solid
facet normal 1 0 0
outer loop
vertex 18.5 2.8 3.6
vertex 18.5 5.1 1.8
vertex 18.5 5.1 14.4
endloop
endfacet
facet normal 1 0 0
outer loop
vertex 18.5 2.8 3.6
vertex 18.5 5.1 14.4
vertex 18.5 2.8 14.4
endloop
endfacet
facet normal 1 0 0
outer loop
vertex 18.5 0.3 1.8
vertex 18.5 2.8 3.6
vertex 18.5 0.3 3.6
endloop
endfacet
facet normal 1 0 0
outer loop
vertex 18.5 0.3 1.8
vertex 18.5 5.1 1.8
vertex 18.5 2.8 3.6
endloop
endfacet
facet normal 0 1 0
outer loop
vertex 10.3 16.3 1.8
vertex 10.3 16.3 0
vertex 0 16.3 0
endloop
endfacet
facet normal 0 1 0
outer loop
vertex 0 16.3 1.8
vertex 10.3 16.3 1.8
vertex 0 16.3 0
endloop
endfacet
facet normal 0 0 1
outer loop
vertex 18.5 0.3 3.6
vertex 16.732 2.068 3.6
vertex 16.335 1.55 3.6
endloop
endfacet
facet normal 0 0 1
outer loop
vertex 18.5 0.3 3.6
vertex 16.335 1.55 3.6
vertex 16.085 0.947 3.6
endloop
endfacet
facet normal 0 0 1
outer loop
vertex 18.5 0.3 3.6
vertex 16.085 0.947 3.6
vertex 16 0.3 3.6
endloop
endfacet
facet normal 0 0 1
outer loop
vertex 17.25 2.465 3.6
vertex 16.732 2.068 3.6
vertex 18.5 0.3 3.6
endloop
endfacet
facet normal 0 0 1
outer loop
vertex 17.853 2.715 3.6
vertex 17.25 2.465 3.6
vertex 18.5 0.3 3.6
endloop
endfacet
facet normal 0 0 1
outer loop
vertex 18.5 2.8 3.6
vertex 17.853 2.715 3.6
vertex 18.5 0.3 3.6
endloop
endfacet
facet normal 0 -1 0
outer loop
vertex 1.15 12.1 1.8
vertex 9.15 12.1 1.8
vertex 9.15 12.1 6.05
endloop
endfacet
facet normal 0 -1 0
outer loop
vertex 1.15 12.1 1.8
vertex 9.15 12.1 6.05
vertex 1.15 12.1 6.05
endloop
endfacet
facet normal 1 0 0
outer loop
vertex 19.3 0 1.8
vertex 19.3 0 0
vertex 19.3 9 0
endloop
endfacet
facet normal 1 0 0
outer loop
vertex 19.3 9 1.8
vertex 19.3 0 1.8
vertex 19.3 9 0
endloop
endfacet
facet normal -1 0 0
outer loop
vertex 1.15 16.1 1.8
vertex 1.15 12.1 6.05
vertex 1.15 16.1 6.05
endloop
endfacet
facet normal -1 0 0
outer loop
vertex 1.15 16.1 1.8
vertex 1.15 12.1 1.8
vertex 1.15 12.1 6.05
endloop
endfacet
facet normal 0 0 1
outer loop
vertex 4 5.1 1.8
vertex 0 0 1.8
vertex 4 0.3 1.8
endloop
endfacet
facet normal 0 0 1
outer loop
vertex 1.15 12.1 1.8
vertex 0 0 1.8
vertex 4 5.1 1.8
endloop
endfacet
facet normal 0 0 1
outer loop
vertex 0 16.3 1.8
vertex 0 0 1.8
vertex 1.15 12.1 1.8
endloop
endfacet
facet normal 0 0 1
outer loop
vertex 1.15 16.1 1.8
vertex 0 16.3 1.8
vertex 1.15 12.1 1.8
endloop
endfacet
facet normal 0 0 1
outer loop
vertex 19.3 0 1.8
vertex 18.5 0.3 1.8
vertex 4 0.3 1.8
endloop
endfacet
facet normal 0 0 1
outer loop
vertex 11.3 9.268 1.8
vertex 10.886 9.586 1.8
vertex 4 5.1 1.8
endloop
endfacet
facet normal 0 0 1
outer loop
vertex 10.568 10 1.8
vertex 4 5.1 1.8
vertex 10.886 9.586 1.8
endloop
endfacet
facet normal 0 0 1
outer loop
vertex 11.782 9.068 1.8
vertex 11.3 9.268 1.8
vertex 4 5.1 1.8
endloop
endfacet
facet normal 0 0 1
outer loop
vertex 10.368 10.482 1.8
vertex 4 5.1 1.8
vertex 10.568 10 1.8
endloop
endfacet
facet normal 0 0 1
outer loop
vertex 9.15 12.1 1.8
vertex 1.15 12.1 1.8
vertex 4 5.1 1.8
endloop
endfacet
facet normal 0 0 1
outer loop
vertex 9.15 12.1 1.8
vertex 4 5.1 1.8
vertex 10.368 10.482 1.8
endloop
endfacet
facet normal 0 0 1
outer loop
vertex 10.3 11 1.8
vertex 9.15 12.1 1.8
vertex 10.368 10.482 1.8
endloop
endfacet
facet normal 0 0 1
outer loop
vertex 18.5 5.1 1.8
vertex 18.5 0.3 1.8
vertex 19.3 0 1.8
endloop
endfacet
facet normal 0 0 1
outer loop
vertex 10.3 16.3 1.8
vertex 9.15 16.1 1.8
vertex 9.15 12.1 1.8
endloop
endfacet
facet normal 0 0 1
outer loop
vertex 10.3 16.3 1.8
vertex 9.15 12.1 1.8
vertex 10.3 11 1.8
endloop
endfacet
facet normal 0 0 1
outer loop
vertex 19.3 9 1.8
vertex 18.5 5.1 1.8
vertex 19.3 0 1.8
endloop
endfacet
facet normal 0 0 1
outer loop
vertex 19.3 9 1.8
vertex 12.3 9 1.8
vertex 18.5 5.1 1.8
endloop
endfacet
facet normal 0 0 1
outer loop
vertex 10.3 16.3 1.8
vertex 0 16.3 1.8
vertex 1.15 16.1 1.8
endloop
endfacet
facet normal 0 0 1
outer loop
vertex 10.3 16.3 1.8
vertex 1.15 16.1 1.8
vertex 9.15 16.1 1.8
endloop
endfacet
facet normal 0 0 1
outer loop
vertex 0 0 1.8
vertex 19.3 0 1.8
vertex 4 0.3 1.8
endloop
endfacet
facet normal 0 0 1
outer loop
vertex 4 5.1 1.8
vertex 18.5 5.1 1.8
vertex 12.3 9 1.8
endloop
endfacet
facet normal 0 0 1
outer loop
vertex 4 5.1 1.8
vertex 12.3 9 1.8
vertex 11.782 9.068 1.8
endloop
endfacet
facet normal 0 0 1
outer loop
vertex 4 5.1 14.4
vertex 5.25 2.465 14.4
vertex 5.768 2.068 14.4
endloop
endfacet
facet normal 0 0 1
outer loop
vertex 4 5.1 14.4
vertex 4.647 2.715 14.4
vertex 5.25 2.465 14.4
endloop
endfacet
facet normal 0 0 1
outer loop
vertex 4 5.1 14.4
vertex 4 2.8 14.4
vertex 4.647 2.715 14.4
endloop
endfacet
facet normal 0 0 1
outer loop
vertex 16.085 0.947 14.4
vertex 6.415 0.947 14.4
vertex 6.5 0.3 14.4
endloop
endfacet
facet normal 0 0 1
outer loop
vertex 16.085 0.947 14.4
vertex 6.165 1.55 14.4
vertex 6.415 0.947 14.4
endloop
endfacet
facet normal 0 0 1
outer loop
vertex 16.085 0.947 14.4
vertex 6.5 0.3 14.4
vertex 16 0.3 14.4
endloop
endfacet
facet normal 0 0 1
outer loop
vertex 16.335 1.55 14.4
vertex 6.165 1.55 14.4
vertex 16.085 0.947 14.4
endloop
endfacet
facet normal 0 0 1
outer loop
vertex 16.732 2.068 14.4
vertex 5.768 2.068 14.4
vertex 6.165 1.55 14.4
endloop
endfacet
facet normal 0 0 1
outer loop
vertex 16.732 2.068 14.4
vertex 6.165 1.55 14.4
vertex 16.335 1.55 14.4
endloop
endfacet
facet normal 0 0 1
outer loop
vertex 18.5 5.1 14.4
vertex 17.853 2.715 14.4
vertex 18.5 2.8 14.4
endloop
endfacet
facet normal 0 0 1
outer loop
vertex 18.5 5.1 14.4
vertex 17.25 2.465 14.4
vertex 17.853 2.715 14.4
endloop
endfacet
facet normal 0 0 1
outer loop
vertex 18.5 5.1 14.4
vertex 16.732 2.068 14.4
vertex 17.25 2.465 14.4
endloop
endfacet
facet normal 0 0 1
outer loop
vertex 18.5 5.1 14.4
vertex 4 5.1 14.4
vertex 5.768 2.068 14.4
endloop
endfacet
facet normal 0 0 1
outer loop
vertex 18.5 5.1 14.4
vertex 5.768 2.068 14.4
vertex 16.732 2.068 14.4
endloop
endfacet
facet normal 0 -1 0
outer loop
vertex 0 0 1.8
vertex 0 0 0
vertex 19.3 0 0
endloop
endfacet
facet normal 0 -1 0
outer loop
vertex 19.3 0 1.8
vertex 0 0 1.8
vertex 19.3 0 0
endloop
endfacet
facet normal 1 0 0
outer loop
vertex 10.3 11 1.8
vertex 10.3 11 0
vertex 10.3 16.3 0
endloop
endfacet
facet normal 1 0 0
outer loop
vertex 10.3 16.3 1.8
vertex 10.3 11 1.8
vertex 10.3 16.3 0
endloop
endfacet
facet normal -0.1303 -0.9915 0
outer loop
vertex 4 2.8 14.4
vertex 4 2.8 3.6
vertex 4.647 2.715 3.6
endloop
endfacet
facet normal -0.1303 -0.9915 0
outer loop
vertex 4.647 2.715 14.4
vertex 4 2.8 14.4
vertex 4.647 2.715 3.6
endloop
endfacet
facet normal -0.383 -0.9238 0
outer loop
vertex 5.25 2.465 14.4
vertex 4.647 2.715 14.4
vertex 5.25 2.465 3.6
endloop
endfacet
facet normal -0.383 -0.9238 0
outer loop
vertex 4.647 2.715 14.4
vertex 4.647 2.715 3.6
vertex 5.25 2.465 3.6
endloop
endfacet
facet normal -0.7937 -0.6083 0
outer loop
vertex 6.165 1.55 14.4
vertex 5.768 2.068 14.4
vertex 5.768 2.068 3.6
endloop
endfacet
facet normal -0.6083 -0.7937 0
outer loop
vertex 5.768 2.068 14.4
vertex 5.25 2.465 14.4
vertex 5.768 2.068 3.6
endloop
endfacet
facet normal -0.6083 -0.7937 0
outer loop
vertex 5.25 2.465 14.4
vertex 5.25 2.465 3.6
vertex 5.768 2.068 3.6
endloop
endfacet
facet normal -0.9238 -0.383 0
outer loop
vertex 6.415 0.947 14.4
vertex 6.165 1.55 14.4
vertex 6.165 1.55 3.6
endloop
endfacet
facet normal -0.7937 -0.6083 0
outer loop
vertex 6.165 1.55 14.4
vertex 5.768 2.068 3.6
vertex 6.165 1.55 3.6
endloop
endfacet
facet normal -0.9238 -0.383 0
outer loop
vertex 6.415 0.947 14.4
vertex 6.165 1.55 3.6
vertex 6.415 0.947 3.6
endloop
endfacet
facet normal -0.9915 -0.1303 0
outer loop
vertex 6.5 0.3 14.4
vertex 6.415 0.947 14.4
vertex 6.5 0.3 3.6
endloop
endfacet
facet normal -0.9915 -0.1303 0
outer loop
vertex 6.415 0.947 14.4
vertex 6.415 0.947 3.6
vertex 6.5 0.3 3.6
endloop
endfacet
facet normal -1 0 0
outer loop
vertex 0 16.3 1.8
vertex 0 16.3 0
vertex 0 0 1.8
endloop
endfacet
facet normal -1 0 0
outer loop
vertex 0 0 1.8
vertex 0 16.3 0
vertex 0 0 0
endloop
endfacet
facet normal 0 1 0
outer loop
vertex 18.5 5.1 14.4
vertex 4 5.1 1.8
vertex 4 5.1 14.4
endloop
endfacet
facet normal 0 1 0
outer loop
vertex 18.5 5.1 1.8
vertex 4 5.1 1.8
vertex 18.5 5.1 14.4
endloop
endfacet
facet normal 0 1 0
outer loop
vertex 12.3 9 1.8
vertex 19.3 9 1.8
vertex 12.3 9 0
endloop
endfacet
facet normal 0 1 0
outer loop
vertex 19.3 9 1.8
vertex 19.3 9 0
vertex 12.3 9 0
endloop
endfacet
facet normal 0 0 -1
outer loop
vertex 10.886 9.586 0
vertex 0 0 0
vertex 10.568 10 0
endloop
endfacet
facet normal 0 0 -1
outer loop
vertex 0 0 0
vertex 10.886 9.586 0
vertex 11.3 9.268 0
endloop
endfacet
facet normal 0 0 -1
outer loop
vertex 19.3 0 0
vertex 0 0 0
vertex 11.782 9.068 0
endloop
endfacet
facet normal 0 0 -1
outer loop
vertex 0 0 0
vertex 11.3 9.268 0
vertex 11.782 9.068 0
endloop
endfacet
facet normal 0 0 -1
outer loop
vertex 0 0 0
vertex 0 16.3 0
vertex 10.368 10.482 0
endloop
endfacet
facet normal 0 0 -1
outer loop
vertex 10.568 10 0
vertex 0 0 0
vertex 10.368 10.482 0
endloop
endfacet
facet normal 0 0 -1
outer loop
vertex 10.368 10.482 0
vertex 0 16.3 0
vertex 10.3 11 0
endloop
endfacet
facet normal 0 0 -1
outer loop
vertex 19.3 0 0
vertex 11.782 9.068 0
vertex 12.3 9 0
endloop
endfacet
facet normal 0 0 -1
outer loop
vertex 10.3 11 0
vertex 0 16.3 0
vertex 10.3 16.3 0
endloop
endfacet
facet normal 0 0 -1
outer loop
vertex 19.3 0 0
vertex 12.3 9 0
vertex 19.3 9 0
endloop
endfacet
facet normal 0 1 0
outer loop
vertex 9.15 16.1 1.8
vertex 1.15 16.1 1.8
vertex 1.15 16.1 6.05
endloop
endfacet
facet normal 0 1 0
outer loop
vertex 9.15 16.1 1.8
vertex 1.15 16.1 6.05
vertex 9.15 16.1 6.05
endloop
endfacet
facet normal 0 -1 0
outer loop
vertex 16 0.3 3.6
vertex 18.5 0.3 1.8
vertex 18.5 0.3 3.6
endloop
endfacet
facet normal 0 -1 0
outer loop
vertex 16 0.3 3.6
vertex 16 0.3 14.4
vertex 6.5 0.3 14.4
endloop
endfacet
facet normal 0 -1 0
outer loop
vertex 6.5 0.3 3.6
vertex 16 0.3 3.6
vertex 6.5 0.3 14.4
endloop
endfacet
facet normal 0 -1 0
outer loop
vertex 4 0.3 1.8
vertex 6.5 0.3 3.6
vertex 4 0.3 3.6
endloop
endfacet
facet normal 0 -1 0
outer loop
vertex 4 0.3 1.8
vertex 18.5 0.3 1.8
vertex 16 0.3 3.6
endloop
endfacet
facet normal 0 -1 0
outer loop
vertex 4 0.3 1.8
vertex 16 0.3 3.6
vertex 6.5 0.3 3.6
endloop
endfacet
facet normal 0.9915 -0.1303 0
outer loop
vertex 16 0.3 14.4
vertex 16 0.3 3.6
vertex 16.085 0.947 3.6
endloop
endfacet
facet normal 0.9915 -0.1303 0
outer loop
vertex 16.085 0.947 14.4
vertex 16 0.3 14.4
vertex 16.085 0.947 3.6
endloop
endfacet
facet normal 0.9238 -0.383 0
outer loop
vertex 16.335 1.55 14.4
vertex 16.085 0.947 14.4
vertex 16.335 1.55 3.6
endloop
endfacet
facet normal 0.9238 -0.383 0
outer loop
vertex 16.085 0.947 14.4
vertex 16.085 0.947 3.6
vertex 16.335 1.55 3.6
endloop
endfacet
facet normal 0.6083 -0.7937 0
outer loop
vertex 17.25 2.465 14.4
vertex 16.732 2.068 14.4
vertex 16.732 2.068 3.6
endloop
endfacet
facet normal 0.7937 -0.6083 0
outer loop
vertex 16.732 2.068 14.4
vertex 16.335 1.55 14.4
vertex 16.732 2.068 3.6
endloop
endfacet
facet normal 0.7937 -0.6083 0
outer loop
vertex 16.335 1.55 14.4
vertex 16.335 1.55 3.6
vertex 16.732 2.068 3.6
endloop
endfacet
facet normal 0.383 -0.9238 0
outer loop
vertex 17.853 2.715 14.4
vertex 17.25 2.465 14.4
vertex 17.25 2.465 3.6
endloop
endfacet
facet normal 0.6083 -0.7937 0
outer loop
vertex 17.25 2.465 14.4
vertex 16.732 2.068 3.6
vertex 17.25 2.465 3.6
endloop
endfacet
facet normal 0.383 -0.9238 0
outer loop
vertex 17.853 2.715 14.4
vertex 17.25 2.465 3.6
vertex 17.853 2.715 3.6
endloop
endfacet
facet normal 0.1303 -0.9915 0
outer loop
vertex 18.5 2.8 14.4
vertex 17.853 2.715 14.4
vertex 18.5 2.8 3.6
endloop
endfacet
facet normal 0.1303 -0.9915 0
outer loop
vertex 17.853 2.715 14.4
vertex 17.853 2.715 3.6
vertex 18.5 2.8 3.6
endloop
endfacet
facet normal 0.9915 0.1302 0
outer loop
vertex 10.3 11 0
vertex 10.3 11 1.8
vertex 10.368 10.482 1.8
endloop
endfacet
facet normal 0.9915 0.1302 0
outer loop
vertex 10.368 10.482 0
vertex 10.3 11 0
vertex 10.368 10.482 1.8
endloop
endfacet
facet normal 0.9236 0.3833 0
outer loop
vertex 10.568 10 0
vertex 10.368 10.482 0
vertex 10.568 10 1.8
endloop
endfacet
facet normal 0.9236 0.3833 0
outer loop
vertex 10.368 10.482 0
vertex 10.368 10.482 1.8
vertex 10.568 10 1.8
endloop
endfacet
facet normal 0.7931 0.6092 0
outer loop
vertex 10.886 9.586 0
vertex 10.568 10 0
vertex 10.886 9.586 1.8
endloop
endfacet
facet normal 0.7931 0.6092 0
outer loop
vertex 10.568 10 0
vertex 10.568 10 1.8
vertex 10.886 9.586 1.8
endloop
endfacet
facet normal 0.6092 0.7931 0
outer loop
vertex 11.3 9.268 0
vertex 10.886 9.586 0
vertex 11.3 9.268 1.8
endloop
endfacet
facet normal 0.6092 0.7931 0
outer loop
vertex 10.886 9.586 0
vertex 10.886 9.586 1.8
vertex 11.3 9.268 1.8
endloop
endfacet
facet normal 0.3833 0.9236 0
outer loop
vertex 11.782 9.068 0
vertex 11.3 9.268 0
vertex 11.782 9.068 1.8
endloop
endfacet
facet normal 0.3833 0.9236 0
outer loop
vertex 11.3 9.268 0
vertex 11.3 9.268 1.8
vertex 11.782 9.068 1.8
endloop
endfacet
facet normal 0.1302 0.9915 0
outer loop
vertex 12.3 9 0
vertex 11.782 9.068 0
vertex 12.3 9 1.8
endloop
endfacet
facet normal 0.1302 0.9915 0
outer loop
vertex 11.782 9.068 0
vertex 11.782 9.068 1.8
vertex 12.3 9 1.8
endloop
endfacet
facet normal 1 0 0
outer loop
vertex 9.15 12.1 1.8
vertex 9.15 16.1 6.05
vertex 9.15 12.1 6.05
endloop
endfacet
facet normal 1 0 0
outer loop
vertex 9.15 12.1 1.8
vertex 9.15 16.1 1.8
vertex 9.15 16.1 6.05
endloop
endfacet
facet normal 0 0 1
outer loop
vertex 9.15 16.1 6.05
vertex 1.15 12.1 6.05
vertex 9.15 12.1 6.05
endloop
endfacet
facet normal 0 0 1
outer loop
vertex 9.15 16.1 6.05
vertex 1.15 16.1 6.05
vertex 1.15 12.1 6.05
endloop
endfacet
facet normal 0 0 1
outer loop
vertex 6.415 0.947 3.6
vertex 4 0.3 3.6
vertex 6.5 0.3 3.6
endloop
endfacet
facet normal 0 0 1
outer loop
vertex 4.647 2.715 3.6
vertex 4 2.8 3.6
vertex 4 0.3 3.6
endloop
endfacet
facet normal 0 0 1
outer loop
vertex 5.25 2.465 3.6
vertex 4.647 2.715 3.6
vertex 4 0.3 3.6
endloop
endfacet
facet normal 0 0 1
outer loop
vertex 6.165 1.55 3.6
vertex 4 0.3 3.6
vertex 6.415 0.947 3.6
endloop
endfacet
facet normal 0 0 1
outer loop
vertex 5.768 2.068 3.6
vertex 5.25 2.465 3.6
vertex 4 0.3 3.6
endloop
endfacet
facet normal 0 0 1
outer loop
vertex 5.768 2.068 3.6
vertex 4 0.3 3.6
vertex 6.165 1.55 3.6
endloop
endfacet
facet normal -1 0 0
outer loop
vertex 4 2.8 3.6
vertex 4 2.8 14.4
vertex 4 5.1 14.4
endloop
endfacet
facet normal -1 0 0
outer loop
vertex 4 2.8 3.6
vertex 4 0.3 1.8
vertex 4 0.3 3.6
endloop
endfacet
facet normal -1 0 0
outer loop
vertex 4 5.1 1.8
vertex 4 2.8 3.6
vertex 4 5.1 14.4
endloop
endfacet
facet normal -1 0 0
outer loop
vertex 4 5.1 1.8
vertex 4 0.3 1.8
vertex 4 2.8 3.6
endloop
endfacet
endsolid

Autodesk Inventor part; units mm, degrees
ref_plane "YZ Plane" through (0, 0, 0) normal (1, 0, 0) x (0, 1, 0)
ref_plane "XZ Plane" through (0, 0, 0) normal (0, 1, 0) x (-1, 0, 0)
ref_plane "XY Plane" through (0, 0, 0) normal (0, 0, 1) x (1, 0, 0)
sketch "스케치1" plane through (0, 0, 0) normal (0, 0, 1) x (1, 0, 0)
  line L0 (0, 0) -> (19.3, 0)
  line L1 (19.3, 0) -> (19.3, 9)
  line L2 (19.3, 9) -> (10.3, 9)
  line L3 (0, 9) -> (0, 0)
  line L4 (10.3, 9) -> (10.3, 16.3)
  line L5 (10.3, 16.3) -> (0, 16.3)
  line L6 (0, 16.3) -> (0, 9)
  dimension "d0" = 9
  dimension "d1" = 19.3
  dimension "d2" = 16.3
  dimension "d3" = 10.3
extrude "돌출1" add sketch "스케치1" along normal blind 1.8
fillet "모깎기1" radius 2 1 edges at (10.3, 9, 0.9)
sketch "스케치2" plane through (0, 0, 1.8) normal (0, 0, 1) x (1, 0, 0)
  line L0 (18.5, 0.3) -> (4, 0.3)
  line L1 (4, 0.3) -> (4, 5.1)
  line L2 (4, 5.1) -> (18.5, 5.1)
  line L3 (18.5, 5.1) -> (18.5, 0.3)
  line L4 (19.3, 0) -> (19.3, 9) projected
  line L5 (0, 0) -> (19.3, 0) projected
  line L6 (4, 2.8) -> (4, 2.8)
  line L7 (6.5, 0.3) -> (6.5, 0.3)
  line L8 (6.5, 0.3) -> (16, 0.3)
  line L9 (16, 0.3) -> (16, 0.3)
  line L10 (18.5, 2.8) -> (18.5, 2.8)
  arc A0 (6.5, 0.3) -> (4, 2.8) centre (4, 0.3) ccw
  arc A1 (18.5, 2.8) -> (16, 0.3) centre (18.5, 0.3) ccw
  point P0 (6.5, 2.8)
  point P1 (16, 2.8)
  dimension "d7" = 0.8
  dimension "d8" = 14.5
  dimension "d9" = 4.8
  dimension "d10" = 0.3
  dimension "d11" = 2.3
  dimension "d12" = 2.5
  dimension "d13" = 2.5
  dimension "d14" = 2.5
  dimension "d15" = 2.5
extrude "돌출2" add sketch "스케치2" along normal blind 12.6 contours L0 A0 L1 L2 L3 A1
extrude "돌출3" add sketch "스케치2" along normal blind 1.8 contours L0 A1 L3 | L0 L1 A0
sketch "스케치3" plane through (0, 0, 1.8) normal (0, 0, 1) x (1, 0, 0)
  line L0 (1.15, 16.1) -> (9.15, 16.1)
  line L1 (9.15, 16.1) -> (9.15, 12.1)
  line L2 (9.15, 12.1) -> (1.15, 12.1)
  line L3 (1.15, 12.1) -> (1.15, 16.1)
  line L4 (10.3, 16.3) -> (0, 16.3) projected
  point P0 (0, 0)
  point P1 (5.15, 16.1)
  point P2 (5.15, 16.3)
  dimension "d20" = 8
  dimension "d21" = 4
  dimension "d22" = 0.2
extrude "돌출4" add sketch "스케치3" along normal blind 4.25
properties part number "HDMI_Port"
